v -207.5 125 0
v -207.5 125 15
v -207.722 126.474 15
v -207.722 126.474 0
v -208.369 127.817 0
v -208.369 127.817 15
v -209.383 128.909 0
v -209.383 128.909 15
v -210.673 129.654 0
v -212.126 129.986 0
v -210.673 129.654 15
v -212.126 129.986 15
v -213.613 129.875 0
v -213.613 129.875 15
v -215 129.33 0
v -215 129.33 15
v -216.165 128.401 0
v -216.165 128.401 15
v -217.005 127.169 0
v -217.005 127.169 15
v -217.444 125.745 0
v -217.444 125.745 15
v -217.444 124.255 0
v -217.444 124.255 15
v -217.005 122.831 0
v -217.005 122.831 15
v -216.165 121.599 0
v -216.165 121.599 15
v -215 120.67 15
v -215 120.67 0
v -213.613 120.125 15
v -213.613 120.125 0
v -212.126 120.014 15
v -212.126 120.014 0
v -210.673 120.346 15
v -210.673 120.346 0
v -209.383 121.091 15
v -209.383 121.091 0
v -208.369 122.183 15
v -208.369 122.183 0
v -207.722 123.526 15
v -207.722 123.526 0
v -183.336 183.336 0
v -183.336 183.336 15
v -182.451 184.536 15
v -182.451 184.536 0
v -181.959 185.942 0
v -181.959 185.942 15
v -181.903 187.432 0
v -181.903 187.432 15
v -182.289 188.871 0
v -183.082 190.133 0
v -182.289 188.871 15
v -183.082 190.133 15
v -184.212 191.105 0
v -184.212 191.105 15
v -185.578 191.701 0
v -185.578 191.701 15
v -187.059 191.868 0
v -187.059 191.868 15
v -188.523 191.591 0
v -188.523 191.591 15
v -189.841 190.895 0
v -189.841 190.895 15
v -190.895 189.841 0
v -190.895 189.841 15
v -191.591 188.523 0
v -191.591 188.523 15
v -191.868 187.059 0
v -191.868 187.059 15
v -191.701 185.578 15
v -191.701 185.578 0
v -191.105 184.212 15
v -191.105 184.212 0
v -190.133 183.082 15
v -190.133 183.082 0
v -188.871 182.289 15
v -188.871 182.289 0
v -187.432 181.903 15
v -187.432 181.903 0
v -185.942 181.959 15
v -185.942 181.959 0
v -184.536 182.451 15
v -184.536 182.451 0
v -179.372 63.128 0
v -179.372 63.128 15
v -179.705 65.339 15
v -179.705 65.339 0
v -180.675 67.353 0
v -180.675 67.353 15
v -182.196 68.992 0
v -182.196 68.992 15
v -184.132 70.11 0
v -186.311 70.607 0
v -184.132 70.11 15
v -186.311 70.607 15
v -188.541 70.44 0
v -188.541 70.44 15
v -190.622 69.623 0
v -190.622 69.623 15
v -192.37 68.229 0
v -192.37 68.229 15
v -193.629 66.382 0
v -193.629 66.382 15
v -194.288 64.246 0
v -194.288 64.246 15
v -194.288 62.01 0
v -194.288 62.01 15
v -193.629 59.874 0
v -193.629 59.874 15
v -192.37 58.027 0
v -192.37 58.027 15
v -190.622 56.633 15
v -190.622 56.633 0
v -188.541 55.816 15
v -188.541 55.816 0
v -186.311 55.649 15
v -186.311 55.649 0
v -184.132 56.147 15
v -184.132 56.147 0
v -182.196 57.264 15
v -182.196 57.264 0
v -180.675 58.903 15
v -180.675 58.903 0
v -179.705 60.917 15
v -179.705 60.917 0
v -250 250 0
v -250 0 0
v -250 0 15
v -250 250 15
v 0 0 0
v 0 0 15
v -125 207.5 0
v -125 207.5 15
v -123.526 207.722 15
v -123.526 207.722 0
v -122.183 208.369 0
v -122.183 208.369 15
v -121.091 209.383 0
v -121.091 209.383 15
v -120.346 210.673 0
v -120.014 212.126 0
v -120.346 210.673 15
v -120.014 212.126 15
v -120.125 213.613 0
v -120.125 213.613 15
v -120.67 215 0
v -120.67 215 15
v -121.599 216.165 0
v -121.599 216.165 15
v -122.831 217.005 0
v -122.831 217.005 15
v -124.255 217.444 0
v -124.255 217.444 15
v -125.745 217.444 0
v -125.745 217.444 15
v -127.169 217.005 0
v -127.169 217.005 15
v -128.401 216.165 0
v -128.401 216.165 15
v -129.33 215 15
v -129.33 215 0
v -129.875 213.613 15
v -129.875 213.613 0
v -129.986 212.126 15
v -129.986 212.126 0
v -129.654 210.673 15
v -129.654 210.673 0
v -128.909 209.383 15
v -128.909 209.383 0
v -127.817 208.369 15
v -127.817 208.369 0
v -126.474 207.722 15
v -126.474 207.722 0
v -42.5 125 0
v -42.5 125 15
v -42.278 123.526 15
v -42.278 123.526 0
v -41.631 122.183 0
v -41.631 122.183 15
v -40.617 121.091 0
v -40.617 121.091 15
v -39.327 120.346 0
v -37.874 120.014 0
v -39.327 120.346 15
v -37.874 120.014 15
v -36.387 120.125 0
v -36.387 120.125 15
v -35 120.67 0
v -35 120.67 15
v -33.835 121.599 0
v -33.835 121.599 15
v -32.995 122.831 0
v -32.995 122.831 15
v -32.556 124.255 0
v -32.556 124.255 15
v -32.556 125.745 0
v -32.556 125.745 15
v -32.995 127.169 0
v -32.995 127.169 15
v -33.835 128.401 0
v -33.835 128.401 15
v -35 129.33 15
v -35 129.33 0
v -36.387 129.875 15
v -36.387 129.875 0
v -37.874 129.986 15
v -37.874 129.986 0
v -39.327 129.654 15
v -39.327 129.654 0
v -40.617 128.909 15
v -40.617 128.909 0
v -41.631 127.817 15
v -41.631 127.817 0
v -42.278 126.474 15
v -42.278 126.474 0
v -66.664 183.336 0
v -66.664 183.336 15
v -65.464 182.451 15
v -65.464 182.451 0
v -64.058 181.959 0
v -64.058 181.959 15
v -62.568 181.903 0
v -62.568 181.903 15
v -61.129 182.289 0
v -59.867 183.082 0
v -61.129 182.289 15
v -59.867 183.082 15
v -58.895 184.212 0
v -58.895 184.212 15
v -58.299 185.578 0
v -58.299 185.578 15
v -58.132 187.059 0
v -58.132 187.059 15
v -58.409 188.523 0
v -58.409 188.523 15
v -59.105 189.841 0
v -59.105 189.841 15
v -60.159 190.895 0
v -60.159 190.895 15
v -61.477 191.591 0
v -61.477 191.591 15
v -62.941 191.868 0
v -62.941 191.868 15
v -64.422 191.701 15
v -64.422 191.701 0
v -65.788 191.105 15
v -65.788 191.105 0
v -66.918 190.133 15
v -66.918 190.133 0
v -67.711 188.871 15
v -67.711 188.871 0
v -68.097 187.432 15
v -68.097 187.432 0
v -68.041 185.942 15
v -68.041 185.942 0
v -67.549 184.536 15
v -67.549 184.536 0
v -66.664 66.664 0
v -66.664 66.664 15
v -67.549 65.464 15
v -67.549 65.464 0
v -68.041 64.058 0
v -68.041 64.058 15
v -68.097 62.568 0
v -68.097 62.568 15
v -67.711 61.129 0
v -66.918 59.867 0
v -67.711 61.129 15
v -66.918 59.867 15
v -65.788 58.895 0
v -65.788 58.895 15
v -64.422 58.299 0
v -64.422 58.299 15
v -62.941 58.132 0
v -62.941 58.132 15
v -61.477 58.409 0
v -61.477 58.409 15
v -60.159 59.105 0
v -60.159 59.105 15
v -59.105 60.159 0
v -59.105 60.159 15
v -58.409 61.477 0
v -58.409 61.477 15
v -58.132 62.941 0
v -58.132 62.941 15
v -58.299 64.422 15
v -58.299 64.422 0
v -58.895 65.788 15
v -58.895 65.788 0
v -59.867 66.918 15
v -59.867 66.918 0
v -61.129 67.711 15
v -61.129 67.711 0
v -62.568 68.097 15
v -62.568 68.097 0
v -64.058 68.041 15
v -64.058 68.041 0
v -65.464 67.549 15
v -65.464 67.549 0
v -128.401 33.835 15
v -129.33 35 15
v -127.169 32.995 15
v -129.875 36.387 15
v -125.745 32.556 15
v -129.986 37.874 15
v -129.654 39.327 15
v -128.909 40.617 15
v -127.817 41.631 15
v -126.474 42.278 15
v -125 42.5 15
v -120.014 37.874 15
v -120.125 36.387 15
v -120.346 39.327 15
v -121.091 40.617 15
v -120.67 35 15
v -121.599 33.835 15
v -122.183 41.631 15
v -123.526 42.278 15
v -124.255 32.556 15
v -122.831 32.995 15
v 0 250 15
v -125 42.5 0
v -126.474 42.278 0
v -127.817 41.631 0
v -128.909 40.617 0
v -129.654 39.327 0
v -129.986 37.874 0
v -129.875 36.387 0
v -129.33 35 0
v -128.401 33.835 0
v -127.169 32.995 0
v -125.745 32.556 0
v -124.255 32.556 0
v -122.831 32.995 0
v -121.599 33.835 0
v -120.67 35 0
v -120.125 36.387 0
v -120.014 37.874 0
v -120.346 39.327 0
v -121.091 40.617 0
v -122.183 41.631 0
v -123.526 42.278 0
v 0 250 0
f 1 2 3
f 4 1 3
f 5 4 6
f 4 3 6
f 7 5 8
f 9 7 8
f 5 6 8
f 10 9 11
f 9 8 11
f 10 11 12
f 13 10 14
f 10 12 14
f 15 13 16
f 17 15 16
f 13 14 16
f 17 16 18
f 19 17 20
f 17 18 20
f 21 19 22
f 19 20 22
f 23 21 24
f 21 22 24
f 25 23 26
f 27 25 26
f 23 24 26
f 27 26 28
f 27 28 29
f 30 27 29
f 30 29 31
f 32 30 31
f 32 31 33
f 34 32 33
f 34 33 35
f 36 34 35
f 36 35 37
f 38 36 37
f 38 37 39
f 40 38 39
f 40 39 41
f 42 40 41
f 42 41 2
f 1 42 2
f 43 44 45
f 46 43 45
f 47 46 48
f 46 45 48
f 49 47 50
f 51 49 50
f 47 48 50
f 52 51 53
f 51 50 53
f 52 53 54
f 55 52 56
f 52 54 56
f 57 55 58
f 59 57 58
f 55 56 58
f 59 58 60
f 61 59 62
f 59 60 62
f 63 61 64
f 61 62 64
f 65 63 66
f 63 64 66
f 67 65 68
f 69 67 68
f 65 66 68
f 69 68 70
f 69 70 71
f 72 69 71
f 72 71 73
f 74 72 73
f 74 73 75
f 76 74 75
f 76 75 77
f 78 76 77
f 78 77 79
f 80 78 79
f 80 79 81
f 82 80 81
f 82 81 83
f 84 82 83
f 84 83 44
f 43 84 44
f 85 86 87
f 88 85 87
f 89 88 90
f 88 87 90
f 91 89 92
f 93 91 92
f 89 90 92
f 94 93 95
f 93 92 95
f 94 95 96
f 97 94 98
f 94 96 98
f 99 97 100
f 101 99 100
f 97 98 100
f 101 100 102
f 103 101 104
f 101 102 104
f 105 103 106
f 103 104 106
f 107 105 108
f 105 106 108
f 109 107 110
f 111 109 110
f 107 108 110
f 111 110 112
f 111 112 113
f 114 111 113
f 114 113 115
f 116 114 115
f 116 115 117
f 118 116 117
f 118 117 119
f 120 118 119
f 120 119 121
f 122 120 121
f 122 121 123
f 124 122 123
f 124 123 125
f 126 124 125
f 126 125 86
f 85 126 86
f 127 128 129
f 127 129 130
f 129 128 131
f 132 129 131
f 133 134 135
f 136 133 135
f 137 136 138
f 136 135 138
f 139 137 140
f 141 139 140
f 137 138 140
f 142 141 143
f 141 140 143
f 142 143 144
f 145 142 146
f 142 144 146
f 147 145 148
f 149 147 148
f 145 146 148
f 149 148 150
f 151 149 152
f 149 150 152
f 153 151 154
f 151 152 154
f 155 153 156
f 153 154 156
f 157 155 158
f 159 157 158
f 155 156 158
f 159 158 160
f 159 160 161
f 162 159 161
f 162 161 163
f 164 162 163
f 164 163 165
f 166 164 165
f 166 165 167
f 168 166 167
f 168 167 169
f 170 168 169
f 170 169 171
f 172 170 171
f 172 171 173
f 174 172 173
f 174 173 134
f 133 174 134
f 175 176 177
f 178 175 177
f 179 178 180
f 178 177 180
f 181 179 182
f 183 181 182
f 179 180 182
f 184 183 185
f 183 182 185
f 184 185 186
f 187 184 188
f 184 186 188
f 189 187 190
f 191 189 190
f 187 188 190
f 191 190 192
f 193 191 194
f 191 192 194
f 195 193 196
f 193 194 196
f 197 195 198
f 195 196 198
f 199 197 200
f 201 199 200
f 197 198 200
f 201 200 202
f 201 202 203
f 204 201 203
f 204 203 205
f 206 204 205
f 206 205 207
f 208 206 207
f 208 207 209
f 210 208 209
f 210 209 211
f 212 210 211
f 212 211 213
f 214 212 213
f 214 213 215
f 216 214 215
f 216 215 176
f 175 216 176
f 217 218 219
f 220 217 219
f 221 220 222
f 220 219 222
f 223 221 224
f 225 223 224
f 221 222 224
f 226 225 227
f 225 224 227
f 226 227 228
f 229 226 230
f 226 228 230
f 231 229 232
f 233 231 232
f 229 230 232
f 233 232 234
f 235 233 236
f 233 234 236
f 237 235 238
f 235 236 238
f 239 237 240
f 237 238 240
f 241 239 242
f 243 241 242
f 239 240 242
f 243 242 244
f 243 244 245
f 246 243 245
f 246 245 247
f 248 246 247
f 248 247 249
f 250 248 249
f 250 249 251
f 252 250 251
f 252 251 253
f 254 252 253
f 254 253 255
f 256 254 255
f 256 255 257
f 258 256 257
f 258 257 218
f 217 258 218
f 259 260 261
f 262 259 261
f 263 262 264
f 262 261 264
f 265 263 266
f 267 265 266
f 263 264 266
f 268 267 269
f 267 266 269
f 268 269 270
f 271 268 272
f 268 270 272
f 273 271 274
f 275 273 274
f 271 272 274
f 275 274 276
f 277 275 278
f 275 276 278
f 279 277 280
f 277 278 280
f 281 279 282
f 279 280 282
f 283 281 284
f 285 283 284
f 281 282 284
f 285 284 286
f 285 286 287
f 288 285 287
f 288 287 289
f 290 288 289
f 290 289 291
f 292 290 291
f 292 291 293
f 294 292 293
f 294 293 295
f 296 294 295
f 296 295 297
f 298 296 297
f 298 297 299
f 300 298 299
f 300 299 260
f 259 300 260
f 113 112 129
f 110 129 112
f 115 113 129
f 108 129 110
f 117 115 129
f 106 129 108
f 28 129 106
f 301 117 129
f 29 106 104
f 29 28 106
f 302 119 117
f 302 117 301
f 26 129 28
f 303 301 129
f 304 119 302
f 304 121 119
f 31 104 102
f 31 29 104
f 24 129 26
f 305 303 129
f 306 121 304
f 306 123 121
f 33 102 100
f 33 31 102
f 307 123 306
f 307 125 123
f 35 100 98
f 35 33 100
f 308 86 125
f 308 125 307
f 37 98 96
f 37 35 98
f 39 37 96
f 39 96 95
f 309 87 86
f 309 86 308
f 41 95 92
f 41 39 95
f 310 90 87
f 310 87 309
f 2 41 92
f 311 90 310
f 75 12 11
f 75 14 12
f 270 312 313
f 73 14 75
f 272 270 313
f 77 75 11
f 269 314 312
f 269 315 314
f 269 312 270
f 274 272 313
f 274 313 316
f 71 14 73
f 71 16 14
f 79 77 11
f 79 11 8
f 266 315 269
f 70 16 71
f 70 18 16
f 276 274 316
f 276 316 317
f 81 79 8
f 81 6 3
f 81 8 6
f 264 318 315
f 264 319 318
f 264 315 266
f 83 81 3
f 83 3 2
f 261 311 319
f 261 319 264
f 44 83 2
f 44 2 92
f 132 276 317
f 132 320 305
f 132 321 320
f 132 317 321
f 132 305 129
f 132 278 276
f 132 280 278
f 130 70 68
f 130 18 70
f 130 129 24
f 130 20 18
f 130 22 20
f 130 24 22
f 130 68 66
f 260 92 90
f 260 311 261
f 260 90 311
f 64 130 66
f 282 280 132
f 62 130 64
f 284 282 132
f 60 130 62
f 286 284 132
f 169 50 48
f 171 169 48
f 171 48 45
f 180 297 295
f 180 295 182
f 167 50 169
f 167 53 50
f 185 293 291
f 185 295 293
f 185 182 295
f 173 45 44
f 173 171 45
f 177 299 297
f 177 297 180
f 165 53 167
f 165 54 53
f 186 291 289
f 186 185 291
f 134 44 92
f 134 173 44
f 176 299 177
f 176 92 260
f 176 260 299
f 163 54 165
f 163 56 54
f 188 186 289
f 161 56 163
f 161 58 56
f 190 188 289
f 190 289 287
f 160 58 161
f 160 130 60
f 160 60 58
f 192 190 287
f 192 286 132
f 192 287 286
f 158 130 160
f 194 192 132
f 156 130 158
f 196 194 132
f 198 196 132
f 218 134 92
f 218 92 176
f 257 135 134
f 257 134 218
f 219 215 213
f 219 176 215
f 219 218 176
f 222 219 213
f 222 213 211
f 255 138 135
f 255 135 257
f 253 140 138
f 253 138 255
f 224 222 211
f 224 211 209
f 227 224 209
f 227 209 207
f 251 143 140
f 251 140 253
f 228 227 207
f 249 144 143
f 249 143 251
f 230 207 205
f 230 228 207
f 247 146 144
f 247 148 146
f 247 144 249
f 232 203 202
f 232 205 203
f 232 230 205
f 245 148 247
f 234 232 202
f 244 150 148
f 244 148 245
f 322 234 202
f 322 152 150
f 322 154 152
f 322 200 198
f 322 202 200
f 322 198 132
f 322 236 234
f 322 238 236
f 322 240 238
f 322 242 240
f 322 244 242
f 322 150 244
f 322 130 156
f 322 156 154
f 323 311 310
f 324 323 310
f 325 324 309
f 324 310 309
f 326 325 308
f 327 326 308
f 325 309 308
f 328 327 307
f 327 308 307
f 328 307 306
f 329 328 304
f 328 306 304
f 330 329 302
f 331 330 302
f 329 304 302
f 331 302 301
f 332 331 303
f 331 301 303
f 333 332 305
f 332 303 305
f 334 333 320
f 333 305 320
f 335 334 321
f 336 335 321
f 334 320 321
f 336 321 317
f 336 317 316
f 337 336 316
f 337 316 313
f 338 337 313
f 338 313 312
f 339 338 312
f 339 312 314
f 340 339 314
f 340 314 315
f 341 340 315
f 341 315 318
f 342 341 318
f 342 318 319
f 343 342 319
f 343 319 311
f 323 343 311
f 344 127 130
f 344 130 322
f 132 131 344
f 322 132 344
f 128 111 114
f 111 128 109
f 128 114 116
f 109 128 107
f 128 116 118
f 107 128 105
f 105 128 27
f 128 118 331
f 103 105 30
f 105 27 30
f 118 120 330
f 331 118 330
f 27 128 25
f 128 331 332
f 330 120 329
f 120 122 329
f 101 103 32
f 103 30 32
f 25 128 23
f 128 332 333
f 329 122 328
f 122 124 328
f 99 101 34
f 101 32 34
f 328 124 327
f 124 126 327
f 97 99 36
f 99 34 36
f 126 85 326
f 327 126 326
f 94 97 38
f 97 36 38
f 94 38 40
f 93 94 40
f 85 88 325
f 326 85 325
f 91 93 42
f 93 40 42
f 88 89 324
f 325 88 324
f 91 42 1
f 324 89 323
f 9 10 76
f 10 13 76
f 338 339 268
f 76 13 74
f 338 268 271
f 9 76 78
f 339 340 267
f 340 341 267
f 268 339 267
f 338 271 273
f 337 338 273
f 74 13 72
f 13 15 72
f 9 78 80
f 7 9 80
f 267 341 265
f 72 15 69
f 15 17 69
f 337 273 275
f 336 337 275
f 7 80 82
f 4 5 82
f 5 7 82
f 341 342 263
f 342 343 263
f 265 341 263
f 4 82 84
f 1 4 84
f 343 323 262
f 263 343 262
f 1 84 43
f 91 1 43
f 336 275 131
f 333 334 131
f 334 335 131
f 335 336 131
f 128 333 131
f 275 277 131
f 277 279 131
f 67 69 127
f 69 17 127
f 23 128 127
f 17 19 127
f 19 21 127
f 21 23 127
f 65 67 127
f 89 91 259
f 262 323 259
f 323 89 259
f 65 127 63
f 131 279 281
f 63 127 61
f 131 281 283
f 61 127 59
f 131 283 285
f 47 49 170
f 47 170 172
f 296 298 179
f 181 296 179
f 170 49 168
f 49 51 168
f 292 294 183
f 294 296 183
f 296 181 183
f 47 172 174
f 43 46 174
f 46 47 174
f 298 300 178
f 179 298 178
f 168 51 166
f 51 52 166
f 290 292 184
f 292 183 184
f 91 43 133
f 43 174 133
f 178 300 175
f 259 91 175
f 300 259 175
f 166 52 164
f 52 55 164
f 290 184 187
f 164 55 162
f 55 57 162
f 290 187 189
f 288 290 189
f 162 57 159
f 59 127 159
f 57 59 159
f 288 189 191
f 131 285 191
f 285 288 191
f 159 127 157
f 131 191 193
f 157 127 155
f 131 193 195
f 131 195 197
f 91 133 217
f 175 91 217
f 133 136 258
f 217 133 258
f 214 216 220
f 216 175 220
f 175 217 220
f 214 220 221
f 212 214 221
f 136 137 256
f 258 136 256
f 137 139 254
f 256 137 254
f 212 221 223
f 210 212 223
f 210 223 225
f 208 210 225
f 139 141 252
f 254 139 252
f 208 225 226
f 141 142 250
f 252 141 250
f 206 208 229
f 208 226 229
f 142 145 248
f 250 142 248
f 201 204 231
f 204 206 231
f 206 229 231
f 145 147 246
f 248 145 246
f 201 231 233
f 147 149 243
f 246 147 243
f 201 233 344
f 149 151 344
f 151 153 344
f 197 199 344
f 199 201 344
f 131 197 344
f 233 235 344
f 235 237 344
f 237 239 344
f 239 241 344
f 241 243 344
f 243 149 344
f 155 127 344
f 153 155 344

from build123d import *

# Parameters (mm, degrees)
F0_W            = 250
F0_H            = 250
F1_DEPTH        = 15
F5_R            = 5
F6_DEPTH        = 15.001
F6_COPIES_COUNT = 7
F6_COPIES_ANGLE = 270
F8_R            = 7.5
F9_DEPTH        = 15.001


# Not quite as in the source:
# - a pattern or mirror of a feature is missing from the dataset's text; its kind, count and spacing are read off the source's solid


with BuildPart() as f1:
    # F0 (on Top) → F1 (new body)
    with BuildSketch(Plane.XY):
        with Locations((-125, 125)):
            Rectangle(F0_W, F0_H)
    extrude(amount=F1_DEPTH)

    # F5 (on face) → F6 (cut, through all)
    with BuildSketch(Plane.XY.offset(15)):
        with Locations((-212.5, 125)):
            Circle(F5_R)
    f6 = extrude(amount=-F6_DEPTH, mode=Mode.SUBTRACT)

    # F6_copies: F6 ×7 about axis
    f6_copies_axis = Axis((-125, 125, 0), (0, 0, -1))
    for i in range(1, F6_COPIES_COUNT):
        add(f6.rotate(f6_copies_axis, i * F6_COPIES_ANGLE / (F6_COPIES_COUNT - 1)), mode=Mode.SUBTRACT)

    # F8 (on face) → F9 (cut, through all)
    with BuildSketch(Plane.XY.offset(15)):
        with Locations((-186.8718433538, 63.1281566462)):
            Circle(F8_R)
    extrude(amount=-F9_DEPTH, mode=Mode.SUBTRACT)


solid = f1.part
